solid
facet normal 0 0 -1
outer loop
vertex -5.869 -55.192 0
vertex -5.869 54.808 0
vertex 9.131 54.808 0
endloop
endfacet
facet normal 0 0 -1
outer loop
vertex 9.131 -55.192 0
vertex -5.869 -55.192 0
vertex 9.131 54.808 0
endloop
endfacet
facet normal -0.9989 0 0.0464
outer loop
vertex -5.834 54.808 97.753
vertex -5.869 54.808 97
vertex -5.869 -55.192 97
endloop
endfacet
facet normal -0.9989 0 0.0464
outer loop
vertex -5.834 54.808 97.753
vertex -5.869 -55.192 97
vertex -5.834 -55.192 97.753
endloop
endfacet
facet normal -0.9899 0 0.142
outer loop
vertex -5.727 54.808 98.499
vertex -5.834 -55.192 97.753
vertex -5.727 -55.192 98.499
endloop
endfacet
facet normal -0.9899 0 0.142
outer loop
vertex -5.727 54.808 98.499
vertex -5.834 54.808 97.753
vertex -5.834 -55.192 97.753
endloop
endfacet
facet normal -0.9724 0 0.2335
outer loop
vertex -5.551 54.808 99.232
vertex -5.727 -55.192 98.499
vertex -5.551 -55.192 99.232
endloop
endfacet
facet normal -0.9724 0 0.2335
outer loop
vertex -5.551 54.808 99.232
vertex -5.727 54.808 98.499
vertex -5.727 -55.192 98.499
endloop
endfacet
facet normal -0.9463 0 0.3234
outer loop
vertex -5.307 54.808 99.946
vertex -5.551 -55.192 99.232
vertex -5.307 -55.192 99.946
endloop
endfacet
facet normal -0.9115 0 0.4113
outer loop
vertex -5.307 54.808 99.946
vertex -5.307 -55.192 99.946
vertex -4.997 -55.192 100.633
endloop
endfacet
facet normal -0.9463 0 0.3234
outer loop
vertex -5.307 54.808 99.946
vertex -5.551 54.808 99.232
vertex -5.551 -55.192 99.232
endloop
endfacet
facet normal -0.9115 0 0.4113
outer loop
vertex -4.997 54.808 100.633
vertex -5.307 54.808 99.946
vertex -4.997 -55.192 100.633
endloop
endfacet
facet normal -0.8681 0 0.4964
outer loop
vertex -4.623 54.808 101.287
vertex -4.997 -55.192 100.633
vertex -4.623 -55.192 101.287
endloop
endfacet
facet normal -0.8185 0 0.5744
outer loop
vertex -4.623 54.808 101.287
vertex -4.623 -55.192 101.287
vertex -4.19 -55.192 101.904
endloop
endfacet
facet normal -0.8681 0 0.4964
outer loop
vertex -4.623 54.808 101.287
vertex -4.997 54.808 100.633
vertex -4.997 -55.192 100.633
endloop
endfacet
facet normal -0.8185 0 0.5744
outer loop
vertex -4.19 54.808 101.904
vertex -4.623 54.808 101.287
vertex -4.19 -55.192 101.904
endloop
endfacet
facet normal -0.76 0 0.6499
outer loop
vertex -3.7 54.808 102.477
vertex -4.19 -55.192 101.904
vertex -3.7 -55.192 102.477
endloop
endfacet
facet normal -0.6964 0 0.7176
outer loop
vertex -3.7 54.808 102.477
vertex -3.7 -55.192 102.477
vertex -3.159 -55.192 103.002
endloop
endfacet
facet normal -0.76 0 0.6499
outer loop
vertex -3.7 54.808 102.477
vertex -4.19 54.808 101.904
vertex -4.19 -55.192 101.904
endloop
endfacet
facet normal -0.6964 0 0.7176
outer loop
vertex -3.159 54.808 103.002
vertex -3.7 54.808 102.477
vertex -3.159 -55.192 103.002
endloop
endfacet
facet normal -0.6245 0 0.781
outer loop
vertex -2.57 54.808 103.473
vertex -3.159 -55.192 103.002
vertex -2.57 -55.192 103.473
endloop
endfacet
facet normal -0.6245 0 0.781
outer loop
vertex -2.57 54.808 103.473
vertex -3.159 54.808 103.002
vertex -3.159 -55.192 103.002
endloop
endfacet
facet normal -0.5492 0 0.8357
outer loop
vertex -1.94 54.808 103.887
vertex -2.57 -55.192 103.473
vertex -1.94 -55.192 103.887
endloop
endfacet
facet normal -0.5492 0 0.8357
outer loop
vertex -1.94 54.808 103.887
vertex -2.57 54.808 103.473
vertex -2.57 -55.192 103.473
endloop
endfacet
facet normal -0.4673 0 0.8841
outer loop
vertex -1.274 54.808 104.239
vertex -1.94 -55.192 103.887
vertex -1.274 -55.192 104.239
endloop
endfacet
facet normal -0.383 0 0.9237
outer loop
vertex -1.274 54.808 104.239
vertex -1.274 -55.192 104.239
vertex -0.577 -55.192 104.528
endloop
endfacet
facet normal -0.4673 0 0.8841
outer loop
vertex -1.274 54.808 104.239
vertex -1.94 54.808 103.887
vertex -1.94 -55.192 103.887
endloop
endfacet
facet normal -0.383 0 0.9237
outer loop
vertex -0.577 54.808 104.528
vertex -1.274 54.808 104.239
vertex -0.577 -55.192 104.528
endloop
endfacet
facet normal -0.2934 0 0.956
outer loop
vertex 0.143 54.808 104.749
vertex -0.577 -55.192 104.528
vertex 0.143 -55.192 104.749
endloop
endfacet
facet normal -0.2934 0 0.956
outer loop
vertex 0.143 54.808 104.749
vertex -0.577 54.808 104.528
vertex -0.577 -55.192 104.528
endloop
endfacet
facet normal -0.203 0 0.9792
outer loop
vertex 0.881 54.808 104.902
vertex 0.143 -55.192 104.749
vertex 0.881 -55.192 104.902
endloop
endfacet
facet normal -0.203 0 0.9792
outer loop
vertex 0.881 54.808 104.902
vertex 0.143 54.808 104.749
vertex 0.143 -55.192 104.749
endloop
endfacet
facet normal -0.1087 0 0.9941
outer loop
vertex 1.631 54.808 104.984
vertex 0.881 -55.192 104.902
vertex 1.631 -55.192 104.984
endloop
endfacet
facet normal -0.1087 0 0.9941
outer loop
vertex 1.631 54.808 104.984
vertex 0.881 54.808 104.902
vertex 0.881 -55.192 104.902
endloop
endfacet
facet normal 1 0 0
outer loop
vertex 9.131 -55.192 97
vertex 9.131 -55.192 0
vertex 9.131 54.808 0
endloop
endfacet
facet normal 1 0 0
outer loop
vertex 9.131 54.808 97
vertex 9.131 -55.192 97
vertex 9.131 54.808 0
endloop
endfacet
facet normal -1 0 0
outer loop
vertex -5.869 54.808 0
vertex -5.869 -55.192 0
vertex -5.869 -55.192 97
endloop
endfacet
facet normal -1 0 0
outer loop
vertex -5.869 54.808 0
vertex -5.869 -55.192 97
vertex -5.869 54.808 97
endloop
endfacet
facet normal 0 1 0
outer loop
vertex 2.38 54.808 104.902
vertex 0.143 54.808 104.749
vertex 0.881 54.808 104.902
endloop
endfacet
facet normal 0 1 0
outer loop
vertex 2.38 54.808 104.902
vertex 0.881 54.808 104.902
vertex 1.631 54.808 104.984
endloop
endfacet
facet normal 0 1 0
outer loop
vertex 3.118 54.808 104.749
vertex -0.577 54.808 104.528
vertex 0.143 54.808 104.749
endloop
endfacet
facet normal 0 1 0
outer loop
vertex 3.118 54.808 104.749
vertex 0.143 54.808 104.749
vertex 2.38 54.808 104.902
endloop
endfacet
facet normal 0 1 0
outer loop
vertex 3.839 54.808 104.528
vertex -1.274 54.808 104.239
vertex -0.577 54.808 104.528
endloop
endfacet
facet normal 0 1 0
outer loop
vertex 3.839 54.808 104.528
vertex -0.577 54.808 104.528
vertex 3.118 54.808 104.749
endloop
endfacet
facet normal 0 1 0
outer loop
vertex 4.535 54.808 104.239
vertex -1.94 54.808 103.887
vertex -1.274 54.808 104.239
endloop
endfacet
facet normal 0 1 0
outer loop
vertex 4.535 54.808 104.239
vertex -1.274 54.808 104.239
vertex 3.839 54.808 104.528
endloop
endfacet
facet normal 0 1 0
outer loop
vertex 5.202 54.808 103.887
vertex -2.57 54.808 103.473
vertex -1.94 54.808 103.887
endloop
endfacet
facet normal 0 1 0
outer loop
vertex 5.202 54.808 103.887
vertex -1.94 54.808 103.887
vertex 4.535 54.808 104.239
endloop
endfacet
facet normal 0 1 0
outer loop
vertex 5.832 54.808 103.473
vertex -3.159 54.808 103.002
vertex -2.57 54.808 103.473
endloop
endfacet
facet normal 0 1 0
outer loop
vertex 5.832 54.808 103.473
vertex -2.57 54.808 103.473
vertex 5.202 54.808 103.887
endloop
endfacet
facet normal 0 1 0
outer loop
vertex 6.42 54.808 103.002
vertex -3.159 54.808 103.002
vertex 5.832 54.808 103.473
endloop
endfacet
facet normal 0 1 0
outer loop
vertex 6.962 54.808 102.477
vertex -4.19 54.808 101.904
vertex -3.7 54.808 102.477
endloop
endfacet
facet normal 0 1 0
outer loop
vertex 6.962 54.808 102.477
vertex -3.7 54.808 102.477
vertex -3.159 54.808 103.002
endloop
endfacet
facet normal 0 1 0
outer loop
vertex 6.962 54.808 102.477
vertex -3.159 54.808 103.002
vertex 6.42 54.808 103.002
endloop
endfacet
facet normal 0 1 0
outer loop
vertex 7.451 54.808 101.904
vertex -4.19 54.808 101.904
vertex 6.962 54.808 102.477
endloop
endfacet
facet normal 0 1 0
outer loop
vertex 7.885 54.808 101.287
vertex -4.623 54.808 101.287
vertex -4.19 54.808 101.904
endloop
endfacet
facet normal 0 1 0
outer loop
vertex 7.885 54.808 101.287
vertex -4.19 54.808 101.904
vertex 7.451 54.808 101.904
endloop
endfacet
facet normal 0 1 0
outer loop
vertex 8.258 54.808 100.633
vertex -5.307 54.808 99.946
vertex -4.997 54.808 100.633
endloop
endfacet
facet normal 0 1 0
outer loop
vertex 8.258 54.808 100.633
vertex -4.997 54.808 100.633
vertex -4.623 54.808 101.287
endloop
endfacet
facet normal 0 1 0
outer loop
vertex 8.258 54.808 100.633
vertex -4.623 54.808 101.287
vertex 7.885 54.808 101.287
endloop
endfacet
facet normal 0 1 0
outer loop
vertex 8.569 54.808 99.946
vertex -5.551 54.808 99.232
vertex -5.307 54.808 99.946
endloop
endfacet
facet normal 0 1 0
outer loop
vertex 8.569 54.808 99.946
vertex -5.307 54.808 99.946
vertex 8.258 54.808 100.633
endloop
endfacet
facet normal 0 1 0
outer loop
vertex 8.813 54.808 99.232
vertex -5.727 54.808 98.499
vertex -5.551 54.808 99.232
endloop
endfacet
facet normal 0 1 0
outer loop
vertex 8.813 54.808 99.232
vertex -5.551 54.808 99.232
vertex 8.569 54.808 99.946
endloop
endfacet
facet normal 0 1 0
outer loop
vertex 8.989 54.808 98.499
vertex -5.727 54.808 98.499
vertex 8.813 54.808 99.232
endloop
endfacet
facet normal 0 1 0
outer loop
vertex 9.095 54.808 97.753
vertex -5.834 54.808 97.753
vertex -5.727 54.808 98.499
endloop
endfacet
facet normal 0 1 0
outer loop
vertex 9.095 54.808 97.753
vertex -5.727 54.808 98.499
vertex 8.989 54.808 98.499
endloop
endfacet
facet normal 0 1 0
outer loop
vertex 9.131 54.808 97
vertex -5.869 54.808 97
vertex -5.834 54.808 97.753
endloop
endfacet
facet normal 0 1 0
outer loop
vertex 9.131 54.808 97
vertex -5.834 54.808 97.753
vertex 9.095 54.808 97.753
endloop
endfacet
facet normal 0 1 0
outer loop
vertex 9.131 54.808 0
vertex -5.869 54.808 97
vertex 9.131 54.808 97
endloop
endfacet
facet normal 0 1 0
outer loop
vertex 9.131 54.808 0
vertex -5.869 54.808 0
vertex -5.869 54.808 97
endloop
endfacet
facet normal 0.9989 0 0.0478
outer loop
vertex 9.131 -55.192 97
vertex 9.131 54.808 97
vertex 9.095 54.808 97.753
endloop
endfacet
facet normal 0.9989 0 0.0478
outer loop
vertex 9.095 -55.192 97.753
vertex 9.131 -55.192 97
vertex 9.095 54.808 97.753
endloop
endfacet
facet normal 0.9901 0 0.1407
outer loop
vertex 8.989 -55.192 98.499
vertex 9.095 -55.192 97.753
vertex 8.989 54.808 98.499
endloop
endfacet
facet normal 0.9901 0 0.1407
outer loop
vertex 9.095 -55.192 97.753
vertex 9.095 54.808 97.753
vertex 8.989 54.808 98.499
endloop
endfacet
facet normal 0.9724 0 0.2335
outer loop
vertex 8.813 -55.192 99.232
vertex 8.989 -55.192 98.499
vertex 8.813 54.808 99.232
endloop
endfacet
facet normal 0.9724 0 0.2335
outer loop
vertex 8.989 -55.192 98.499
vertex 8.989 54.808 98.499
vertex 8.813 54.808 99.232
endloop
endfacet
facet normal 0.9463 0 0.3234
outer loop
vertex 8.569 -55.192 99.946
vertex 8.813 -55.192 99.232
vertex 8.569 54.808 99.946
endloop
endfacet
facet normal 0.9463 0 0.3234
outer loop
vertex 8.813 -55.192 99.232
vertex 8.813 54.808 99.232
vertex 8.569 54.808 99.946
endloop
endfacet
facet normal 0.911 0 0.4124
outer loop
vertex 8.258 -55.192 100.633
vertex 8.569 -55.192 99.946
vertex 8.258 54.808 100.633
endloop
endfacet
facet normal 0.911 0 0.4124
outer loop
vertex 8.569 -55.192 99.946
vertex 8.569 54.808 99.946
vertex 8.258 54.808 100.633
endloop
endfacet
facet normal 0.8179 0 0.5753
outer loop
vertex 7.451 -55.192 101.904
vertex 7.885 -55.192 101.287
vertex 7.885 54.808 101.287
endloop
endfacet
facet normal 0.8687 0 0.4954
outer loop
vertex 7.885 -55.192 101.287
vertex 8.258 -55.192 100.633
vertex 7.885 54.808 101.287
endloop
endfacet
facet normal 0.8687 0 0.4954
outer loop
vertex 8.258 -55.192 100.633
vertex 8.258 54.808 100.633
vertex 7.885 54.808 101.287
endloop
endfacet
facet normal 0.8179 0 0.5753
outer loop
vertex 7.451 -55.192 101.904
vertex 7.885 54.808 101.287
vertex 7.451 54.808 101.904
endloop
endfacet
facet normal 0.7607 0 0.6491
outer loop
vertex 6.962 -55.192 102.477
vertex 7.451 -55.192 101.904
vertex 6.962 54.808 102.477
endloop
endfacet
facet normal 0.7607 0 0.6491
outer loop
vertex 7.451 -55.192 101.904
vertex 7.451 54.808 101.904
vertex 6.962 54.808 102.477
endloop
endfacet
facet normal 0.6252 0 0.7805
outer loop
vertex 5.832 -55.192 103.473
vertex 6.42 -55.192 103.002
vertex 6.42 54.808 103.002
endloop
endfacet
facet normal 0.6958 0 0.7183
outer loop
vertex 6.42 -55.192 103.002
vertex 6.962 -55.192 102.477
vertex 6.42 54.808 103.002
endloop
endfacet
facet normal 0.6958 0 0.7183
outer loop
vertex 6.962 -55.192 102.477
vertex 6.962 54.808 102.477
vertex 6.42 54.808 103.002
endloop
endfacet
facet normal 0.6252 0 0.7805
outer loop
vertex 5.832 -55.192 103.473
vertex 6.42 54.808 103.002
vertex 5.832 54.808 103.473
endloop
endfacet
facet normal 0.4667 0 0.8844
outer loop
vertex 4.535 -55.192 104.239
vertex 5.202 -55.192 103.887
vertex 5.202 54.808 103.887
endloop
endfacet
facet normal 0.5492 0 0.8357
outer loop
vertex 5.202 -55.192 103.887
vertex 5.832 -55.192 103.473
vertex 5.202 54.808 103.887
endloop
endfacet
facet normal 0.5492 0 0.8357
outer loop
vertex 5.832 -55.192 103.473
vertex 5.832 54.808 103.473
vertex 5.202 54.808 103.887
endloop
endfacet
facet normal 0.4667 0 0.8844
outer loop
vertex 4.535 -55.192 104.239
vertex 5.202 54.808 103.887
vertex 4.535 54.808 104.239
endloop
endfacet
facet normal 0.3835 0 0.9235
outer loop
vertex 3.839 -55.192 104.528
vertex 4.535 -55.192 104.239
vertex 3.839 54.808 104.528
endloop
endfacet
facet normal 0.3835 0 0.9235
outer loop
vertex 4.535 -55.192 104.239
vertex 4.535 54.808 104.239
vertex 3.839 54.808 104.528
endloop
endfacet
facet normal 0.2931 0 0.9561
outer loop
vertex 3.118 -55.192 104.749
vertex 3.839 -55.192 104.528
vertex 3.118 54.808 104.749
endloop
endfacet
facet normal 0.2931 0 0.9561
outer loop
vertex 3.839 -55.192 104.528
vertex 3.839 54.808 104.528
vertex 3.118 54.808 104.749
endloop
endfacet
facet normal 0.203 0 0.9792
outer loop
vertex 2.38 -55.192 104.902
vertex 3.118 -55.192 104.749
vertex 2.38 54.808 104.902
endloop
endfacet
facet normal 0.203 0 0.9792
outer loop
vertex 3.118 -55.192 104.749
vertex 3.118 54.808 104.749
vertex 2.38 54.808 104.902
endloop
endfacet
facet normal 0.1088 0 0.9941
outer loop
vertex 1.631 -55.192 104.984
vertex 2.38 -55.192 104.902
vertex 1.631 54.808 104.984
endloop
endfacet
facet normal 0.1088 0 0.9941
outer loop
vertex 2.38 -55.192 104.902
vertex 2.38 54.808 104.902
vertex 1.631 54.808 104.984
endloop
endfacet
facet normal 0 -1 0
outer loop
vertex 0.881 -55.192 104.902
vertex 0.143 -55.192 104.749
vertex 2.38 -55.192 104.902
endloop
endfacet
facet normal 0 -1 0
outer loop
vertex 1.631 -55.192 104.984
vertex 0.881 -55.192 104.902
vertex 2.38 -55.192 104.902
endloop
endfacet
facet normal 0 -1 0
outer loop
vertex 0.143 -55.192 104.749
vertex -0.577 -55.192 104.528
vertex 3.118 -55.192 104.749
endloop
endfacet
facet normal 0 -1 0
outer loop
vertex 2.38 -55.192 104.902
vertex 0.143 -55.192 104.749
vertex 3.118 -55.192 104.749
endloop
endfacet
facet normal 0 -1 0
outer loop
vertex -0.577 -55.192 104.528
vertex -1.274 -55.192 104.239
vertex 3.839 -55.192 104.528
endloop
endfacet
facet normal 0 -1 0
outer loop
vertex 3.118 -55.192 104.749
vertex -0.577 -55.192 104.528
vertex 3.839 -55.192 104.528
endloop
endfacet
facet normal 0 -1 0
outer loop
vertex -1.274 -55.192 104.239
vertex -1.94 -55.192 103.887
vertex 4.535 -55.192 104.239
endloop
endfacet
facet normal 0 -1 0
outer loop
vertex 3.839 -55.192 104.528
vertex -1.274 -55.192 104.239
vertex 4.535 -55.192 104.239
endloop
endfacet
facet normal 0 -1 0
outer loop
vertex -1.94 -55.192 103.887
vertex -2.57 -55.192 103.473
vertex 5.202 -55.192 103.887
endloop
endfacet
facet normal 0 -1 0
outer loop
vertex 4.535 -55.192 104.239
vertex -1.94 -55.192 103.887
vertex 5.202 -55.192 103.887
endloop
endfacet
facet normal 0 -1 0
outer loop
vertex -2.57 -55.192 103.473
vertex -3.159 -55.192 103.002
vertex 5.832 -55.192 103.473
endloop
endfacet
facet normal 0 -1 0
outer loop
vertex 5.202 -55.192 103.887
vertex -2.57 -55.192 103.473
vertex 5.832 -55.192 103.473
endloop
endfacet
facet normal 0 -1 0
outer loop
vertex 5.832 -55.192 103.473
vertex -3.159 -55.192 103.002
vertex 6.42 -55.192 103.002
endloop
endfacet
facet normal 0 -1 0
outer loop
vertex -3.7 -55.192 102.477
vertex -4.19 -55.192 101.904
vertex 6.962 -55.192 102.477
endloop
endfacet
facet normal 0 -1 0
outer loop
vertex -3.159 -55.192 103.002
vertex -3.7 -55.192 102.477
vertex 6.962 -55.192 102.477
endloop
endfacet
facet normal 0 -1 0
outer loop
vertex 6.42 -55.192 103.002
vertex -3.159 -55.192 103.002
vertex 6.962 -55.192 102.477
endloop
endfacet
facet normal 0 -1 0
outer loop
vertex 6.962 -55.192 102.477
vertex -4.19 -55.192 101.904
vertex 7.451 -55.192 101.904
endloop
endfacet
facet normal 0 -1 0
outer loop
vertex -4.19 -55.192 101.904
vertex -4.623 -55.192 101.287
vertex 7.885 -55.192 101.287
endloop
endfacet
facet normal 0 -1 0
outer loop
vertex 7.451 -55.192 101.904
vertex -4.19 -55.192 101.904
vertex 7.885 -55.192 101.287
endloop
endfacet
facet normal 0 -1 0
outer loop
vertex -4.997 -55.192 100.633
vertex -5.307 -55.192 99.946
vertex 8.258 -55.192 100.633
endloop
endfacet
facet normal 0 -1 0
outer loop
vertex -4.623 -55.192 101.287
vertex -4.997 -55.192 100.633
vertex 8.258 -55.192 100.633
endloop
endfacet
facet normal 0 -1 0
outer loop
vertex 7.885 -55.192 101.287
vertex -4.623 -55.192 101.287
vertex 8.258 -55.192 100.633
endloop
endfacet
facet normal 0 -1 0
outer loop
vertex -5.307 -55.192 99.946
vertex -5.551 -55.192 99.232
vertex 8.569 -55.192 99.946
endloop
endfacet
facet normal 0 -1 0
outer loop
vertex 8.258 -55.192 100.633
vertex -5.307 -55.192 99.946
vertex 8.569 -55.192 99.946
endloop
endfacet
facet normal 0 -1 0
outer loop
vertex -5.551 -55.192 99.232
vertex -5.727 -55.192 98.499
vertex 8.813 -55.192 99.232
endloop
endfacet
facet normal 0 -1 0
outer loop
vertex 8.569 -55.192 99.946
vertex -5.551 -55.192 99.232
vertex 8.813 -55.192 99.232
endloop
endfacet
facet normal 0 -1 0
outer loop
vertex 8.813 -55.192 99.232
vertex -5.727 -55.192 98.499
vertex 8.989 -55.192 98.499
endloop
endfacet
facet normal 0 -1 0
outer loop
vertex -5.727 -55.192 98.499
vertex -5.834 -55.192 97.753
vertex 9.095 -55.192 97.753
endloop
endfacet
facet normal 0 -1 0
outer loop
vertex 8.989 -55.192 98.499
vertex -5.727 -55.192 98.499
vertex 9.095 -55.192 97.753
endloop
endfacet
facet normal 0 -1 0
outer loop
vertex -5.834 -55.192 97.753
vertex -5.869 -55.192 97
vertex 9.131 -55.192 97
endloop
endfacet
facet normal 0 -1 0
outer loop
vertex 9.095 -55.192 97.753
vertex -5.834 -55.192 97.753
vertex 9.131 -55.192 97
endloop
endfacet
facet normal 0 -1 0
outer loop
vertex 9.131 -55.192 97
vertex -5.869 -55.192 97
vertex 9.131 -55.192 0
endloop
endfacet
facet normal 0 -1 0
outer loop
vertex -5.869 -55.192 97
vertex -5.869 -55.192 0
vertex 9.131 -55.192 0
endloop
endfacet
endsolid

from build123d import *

# Parameters (mm, degrees)
F0_W        = 15
F0_H        = 110
F1_DEPTH    = 105
F2_T1_DEPTH = 150


# Not quite as in the source:
# - a fillet or chamfer that OpenCascade refuses, or shapes differently, is made with other operations: its cross-section is extruded or revolved along the edge and cut away or added


with BuildPart() as f1:
    # F0 (on Top) → F1 (new body)
    with BuildSketch(Plane.XY):
        with Locations((1.6307681799, -0.1918845651)):
            Rectangle(F0_W, F0_H)
    extrude(amount=F1_DEPTH)

    # F2: fillet of radius 8 on 2 edges, made by hand

    # F2_s2 → F2_t1 (cut)
    with BuildSketch(Plane.XZ.offset(-74.8081154349)):
        with BuildLine():
            ThreePointArc((-5.8692318201, 97), (-3.5260860696, 102.6568542495), (2.1307681799, 105))
            Line((2.1307681799, 105), (-5.8692318201, 105))
            Line((-5.8692318201, 105), (-5.8692318201, 97))
        make_face()
        with BuildLine():
            ThreePointArc((9.1307681799, 97), (6.7876224294, 102.6568542495), (1.1307681799, 105))
            Line((1.1307681799, 105), (9.1307681799, 105))
            Line((9.1307681799, 105), (9.1307681799, 97))
        make_face()
    extrude(amount=F2_T1_DEPTH, mode=Mode.SUBTRACT)


solid = f1.part
